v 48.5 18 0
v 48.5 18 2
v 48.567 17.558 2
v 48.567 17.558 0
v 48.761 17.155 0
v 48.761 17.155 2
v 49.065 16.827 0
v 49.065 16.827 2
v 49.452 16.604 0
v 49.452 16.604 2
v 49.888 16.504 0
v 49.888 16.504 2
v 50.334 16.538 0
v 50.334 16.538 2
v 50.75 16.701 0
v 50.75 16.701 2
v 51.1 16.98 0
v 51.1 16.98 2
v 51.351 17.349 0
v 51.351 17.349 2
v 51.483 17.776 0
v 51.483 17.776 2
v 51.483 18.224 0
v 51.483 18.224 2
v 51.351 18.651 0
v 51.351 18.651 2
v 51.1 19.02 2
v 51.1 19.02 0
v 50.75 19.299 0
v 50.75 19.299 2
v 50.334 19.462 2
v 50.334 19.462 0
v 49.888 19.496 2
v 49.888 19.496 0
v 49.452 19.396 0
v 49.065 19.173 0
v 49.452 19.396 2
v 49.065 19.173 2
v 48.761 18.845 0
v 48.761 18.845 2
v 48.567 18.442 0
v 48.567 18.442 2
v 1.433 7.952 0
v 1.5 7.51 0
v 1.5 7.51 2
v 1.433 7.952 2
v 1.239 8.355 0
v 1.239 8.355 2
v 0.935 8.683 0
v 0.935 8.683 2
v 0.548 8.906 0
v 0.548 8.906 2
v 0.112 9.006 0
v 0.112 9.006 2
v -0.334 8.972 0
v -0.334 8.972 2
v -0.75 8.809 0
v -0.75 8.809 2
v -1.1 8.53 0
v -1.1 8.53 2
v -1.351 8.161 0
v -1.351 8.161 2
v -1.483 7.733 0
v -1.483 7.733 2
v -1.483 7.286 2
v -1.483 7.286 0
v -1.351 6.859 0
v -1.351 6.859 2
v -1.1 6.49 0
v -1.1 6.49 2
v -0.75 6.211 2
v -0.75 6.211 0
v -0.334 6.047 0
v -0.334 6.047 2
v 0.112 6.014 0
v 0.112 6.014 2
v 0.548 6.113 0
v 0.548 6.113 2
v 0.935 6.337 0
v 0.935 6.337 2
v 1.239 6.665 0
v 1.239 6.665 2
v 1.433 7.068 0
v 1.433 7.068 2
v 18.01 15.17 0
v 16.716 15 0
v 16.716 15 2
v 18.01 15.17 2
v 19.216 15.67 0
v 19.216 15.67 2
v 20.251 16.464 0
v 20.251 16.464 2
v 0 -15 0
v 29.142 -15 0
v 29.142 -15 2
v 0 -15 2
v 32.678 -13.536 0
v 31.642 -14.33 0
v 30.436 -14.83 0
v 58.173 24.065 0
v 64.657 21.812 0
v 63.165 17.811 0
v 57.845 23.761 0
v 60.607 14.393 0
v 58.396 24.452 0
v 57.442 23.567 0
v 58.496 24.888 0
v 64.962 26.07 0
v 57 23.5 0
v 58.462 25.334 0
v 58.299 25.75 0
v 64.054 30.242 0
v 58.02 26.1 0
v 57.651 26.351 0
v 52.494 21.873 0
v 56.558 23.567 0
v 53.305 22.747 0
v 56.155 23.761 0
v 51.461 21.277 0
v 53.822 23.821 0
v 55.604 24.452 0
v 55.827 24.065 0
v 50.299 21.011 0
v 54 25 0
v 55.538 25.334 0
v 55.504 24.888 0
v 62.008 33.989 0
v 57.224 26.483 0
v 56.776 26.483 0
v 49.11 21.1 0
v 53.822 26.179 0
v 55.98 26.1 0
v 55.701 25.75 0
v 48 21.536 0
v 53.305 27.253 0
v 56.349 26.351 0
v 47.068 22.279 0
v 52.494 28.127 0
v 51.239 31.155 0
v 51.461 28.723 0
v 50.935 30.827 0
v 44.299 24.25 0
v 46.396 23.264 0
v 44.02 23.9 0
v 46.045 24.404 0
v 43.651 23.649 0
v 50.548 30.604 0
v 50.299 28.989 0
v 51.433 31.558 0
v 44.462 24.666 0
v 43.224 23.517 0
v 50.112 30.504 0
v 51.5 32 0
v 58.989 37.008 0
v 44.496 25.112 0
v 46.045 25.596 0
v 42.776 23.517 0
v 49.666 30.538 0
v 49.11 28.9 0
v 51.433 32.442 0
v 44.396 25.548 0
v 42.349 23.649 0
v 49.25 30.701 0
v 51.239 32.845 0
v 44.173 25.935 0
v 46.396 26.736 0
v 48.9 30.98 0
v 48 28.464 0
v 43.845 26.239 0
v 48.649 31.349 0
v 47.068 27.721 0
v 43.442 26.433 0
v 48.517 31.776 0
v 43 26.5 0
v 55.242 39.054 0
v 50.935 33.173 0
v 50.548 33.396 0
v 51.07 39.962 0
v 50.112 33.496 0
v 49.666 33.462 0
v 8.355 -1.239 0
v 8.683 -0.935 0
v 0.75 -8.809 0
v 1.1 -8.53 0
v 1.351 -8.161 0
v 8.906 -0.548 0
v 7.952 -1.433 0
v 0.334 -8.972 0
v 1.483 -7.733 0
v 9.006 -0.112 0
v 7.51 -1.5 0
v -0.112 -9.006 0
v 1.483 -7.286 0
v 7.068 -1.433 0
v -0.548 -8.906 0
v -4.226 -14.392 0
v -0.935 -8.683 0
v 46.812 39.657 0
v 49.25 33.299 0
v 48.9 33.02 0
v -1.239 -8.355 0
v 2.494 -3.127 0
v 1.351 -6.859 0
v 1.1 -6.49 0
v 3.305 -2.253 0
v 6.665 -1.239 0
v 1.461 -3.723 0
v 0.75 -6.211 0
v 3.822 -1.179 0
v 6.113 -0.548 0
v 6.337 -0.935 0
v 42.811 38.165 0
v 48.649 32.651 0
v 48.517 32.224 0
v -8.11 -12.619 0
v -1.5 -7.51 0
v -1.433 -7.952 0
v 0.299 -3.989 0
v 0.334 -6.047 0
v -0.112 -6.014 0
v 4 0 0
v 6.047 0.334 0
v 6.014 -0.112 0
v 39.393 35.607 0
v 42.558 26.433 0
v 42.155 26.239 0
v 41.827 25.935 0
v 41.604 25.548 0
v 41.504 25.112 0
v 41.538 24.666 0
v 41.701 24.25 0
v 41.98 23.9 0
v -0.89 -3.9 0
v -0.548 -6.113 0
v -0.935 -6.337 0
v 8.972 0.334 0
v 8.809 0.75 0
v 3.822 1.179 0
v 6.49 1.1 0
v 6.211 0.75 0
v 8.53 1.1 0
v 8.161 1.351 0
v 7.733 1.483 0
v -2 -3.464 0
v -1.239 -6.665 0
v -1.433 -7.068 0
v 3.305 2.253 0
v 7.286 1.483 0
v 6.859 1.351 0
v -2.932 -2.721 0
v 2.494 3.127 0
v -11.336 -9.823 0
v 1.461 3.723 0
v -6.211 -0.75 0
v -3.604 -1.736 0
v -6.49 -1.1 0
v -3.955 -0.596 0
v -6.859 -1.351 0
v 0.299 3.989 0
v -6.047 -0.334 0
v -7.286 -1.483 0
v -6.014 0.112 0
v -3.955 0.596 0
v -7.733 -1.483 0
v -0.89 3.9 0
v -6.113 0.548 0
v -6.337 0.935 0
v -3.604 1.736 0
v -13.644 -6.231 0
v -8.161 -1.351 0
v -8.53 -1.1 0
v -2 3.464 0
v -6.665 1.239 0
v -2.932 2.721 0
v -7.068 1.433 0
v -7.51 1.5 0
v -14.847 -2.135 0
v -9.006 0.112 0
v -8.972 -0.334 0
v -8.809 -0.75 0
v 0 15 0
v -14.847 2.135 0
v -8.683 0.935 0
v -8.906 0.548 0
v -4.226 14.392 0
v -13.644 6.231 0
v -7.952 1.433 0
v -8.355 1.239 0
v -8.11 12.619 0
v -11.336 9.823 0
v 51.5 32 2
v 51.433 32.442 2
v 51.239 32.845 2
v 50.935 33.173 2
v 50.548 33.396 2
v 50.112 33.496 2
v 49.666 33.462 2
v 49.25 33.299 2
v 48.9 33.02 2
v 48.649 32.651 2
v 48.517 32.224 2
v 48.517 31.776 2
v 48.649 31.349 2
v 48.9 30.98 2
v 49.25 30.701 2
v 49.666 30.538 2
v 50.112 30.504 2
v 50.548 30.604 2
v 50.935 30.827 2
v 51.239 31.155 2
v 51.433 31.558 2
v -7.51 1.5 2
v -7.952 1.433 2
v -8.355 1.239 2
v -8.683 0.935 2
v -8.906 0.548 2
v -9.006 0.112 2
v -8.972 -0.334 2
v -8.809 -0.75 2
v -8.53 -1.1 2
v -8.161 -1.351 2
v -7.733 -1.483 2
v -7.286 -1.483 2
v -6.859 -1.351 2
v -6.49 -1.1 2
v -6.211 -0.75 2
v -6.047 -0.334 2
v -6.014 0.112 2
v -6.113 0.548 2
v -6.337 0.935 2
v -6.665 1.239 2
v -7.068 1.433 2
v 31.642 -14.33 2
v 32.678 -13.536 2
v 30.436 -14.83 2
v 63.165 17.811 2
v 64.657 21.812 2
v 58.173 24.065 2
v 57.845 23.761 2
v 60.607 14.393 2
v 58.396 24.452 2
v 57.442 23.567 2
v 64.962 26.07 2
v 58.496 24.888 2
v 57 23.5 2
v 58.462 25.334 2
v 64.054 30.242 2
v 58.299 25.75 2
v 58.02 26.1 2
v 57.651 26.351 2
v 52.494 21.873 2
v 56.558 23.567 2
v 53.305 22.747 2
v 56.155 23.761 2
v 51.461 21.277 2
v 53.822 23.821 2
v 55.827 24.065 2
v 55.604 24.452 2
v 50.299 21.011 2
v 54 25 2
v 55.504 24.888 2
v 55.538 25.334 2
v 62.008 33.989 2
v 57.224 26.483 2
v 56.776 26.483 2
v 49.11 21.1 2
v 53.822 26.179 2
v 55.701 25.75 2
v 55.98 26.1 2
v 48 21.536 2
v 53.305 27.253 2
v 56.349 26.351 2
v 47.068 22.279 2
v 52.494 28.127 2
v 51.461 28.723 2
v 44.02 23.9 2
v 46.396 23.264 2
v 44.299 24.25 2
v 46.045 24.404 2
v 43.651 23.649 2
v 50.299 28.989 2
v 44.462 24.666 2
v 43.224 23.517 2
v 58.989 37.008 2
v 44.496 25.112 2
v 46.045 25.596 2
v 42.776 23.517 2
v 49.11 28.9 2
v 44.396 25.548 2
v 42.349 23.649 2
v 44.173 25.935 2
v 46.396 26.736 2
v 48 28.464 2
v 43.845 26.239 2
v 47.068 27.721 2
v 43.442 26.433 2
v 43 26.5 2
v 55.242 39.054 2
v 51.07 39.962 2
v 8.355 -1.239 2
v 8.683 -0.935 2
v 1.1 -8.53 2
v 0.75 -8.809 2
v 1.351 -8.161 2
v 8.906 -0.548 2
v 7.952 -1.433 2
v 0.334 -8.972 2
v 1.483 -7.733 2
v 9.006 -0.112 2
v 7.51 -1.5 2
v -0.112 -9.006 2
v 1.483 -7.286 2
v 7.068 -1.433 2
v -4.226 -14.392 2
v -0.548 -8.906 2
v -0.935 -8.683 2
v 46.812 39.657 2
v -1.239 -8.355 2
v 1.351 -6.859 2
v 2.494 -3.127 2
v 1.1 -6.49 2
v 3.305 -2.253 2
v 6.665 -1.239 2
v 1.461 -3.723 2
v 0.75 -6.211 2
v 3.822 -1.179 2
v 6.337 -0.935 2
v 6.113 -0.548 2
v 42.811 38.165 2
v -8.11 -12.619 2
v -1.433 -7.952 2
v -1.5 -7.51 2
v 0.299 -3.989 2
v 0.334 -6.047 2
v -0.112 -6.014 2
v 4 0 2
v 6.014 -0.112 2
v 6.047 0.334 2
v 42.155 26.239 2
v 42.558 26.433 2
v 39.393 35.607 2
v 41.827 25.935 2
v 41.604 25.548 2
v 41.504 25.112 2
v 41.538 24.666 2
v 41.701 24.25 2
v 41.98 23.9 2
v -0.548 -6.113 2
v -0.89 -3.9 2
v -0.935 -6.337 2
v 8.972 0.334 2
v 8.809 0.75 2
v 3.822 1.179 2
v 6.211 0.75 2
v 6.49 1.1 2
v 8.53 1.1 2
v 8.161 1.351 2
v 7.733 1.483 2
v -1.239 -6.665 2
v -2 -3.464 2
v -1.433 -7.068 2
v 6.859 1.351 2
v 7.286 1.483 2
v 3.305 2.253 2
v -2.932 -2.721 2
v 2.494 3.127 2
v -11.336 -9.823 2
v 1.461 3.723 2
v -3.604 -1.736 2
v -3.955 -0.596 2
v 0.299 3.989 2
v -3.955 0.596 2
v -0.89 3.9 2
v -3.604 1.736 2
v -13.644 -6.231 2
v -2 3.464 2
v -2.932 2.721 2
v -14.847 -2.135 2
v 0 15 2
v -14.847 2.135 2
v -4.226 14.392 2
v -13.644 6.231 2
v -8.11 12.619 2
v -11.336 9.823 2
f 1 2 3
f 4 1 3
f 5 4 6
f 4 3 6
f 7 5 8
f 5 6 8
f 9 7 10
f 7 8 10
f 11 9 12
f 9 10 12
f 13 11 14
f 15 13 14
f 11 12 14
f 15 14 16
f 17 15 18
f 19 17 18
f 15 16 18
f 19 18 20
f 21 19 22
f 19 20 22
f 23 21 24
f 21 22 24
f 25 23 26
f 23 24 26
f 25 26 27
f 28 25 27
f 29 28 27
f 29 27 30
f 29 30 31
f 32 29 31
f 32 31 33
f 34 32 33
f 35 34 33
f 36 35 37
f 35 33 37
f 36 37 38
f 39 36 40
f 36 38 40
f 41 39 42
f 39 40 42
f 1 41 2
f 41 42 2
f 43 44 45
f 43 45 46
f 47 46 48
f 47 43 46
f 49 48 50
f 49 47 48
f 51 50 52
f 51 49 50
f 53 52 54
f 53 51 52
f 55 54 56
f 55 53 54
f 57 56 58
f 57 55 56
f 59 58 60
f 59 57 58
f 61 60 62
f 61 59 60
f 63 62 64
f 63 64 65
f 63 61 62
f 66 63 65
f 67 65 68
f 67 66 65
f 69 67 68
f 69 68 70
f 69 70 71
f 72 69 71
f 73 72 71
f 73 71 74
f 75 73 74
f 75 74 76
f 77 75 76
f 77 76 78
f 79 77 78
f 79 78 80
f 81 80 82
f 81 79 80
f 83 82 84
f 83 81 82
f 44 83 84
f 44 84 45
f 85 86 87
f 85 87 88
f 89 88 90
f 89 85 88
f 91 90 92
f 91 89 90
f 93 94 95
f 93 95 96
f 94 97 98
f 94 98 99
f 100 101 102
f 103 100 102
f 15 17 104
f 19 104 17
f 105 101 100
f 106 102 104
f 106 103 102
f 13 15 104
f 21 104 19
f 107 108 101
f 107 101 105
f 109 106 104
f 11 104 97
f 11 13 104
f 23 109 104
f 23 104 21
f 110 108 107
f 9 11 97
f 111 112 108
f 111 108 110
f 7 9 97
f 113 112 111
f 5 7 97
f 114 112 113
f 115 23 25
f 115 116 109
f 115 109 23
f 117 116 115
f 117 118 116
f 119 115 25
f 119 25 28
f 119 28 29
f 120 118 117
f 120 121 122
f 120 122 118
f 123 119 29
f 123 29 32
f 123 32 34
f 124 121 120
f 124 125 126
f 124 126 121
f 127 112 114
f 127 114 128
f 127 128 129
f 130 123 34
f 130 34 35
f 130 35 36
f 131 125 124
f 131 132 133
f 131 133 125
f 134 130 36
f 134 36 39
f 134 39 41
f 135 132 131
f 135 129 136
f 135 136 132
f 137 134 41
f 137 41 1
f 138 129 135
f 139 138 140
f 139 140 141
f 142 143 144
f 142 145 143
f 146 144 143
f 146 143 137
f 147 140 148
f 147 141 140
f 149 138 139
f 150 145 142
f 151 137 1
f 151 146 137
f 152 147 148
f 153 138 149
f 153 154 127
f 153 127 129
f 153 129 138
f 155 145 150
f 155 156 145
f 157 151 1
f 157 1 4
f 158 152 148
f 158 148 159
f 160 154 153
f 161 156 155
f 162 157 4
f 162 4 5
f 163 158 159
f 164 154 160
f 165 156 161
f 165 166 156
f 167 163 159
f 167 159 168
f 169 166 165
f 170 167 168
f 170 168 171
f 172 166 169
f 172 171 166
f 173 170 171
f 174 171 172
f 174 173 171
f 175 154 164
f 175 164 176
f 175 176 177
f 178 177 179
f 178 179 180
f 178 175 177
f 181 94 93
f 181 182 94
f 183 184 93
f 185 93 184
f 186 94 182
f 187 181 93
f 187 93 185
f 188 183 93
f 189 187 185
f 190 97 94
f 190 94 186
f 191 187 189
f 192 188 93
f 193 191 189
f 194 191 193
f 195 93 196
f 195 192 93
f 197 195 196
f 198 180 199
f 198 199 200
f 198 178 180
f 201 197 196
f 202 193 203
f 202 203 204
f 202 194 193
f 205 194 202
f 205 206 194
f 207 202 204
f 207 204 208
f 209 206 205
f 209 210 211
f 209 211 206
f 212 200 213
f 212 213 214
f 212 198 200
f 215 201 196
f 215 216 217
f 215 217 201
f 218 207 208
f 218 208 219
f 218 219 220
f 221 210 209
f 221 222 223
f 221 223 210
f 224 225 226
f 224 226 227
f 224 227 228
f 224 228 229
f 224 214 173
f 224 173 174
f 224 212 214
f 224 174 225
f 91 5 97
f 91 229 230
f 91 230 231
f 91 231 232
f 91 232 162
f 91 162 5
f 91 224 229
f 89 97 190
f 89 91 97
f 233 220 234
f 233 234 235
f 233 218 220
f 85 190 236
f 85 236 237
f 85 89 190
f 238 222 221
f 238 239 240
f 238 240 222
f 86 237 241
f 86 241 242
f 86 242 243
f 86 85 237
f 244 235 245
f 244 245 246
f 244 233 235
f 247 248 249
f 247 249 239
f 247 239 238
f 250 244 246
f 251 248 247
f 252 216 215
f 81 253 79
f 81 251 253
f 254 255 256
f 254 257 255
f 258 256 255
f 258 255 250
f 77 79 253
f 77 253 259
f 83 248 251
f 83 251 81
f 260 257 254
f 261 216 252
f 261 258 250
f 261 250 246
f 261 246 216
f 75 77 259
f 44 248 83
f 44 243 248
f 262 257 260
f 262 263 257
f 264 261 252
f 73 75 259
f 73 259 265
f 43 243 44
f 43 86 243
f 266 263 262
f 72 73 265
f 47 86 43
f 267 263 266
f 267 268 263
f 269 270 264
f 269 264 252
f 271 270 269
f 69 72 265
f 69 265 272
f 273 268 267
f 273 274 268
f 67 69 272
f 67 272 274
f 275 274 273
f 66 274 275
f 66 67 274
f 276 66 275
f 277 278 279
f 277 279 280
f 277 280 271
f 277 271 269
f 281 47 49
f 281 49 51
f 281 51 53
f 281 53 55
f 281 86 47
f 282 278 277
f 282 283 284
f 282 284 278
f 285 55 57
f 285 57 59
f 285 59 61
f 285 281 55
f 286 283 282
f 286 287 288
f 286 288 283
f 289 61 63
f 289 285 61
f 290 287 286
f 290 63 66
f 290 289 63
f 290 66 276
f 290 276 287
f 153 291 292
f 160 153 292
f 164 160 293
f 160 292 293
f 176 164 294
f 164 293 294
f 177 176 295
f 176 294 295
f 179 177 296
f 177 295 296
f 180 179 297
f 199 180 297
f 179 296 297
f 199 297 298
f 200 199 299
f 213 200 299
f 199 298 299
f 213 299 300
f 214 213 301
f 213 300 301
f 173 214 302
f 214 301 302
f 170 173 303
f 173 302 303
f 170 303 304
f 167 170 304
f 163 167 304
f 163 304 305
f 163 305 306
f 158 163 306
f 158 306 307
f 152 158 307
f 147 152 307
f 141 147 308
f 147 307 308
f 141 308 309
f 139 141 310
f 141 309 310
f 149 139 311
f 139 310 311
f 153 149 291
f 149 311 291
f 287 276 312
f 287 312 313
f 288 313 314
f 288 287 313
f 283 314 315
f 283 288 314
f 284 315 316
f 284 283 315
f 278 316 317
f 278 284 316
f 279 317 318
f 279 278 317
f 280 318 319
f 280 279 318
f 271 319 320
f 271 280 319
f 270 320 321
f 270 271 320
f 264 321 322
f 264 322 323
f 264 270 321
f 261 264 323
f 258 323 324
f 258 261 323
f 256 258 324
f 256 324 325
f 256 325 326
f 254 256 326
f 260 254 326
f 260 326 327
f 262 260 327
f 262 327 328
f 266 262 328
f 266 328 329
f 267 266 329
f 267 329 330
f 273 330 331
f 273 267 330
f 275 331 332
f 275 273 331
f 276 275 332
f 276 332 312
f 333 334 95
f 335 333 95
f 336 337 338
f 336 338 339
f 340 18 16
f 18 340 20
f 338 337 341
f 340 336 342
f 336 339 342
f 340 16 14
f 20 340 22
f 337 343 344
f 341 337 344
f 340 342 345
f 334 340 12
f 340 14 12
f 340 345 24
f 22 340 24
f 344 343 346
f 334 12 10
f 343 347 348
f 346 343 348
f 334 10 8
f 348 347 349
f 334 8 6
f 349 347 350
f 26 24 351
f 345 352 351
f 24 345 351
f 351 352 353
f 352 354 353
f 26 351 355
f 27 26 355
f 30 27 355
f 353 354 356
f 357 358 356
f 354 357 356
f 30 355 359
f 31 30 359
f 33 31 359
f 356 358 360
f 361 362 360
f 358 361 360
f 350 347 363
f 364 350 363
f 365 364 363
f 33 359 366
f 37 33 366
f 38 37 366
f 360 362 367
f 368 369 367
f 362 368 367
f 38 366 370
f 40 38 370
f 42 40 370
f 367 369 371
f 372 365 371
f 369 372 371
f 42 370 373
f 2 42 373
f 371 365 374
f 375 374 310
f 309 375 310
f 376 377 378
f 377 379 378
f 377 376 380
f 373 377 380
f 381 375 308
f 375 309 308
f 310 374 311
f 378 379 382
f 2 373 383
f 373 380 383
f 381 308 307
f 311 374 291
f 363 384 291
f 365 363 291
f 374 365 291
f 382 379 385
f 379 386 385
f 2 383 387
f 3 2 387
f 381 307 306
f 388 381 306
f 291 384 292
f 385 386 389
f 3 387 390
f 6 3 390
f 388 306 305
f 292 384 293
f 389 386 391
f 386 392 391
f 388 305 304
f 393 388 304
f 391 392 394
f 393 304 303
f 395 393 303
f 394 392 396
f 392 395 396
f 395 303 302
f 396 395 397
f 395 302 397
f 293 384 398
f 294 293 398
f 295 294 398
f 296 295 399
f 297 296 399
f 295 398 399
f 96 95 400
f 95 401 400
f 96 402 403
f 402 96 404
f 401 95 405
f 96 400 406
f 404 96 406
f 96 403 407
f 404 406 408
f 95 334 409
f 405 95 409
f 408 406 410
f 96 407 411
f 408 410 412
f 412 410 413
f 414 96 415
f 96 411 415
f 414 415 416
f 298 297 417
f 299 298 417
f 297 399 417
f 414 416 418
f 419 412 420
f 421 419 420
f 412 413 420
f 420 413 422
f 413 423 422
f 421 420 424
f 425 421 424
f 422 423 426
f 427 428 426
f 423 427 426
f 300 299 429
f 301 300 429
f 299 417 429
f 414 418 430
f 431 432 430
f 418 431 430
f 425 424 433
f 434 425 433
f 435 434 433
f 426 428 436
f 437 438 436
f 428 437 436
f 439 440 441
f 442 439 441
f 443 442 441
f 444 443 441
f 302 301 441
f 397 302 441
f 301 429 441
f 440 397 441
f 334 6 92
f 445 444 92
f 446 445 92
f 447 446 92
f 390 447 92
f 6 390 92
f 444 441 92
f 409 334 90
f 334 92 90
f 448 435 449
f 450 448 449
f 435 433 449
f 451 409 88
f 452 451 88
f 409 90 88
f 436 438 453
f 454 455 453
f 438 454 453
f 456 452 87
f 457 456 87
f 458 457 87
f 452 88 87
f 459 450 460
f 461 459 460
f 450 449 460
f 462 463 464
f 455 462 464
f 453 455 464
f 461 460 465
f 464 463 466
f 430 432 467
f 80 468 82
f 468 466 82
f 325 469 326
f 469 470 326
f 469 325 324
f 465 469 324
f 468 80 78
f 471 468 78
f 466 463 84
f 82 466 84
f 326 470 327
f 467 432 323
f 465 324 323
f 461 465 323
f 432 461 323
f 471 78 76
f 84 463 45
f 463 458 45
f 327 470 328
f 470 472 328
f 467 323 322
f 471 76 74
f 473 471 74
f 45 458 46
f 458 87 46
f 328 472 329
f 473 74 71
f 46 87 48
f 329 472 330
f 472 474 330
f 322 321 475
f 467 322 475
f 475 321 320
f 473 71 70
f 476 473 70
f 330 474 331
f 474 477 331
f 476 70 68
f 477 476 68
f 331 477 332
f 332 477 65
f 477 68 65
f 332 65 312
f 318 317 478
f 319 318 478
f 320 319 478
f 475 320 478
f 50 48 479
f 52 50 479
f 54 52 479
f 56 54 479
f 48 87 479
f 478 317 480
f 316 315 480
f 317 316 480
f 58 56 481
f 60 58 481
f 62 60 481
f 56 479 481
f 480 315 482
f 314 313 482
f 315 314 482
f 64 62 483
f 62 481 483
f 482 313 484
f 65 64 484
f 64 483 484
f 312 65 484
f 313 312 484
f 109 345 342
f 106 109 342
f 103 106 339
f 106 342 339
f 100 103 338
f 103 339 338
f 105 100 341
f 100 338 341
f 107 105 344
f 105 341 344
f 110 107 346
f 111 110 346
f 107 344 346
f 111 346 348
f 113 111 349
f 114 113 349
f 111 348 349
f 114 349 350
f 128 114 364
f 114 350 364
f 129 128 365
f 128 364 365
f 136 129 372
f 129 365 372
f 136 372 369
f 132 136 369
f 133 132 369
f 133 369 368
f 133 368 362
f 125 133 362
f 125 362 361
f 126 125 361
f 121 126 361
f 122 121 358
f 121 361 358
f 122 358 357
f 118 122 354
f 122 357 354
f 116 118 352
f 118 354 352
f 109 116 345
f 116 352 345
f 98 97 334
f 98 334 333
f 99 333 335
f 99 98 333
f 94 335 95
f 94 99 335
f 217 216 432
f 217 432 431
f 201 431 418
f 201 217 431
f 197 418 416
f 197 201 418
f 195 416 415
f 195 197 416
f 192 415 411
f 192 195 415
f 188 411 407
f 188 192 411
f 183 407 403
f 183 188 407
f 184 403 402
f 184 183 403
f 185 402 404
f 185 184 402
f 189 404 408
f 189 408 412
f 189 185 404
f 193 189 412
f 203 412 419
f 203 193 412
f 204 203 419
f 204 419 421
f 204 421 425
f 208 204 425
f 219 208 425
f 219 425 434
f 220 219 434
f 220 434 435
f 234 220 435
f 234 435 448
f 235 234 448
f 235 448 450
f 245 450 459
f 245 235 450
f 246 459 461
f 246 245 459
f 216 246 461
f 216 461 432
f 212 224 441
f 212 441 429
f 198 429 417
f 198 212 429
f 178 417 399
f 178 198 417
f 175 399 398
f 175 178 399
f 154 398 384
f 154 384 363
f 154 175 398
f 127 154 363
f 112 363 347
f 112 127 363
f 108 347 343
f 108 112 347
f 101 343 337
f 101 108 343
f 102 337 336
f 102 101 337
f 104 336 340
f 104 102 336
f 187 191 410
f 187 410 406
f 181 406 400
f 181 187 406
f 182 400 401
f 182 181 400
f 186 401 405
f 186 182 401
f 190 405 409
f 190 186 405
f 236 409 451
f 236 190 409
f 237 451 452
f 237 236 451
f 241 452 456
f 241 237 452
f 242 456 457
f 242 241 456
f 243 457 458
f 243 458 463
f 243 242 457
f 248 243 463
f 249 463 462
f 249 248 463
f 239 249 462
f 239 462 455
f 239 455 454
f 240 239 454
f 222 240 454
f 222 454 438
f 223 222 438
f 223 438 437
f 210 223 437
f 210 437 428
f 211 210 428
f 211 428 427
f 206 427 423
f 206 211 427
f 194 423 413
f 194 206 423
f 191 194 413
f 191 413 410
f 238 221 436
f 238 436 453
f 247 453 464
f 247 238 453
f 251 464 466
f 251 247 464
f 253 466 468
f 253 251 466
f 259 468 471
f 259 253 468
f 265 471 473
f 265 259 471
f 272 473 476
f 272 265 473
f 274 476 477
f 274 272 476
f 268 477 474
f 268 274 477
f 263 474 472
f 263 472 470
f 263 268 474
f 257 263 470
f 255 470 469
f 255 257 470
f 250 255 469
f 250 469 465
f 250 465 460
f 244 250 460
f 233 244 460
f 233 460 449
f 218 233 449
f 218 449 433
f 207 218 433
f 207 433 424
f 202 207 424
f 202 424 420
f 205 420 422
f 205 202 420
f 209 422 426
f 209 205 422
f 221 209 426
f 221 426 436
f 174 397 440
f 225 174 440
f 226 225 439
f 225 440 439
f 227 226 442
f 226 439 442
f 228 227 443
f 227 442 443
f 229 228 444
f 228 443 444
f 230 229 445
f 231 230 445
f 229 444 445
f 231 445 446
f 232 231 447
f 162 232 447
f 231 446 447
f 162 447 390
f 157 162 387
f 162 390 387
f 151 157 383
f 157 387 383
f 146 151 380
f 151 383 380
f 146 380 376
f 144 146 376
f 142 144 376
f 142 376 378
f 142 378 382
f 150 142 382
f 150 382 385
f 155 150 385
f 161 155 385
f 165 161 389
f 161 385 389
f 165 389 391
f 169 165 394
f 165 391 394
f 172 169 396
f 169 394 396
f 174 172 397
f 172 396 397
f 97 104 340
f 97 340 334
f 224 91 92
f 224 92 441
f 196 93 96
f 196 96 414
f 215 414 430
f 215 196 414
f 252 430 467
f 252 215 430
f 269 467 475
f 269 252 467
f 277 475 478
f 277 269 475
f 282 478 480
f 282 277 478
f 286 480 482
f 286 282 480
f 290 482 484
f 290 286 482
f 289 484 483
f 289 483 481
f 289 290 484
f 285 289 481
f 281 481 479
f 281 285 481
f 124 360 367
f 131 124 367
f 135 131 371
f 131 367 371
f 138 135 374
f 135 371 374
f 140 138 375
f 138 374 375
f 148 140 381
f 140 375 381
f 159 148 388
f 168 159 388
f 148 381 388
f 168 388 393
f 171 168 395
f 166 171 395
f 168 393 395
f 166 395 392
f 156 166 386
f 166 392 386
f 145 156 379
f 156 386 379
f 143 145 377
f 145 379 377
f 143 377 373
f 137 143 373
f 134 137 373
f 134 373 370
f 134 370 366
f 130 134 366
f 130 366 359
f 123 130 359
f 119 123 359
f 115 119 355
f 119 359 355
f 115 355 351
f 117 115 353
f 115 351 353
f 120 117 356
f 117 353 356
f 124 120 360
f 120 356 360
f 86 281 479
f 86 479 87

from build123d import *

# Parameters (mm, degrees)
SALIENTE_EXTRUIR1_DEPTH = 2
CROQUIS1_R              = 4
CORTAR_EXTRUIR1_DEPTH   = 2
CROQUIS2_R              = 1.5
CORTAR_EXTRUIR2_DEPTH   = 2
MATRIZC1_COUNT          = 4
CROQUIS4_R              = 4
CORTAR_EXTRUIR3_DEPTH   = 2
CROQUIS5_R              = 1.5
CORTAR_EXTRUIR4_DEPTH   = 2
MATRIZC2_COUNT          = 4


with BuildPart() as part:
    # Croquis3 → Saliente-Extruir1 (new body)
    with BuildSketch(Plane.XY):
        with BuildLine():
            Line((0, 15), (16.715728753, 15))
            ThreePointArc((16.715728753, 15), (18.629145914, 15.380602337), (20.251262658, 16.464466094))
            Line((20.251262658, 16.464466094), (39.393398282, 35.606601717))
            ThreePointArc((39.393398282, 35.606601717), (60.606601717, 35.606601717), (60.606601717, 14.393398282))
            Line((60.606601717, 14.393398282), (32.67766953, -13.535533906))
            ThreePointArc((32.67766953, -13.535533906), (31.055552786, -14.619397663), (29.142135624, -15))
            Line((29.142135624, -15), (0, -15))
            ThreePointArc((0, -15), (-15, 0), (0, 15))
        make_face()
    extrude(amount=SALIENTE_EXTRUIR1_DEPTH)

    # Croquis1 → Cortar-Extruir1 (cut)
    with BuildSketch(Plane.XY):
        Circle(CROQUIS1_R)
    extrude(amount=CORTAR_EXTRUIR1_DEPTH, mode=Mode.SUBTRACT)

    # Croquis2 → Cortar-Extruir2 (cut)
    with BuildSketch(Plane.XY):
        with Locations((0, 7.509798768)):
            Circle(CROQUIS2_R)
    cortar_extruir2 = extrude(amount=CORTAR_EXTRUIR2_DEPTH, mode=Mode.SUBTRACT)

    # MatrizC1: Cortar-Extruir2 ×4 about axis
    matrizc1_axis = Axis((0, 0, 0), (0, 0, 1))
    for i in range(1, MATRIZC1_COUNT):
        add(cortar_extruir2.rotate(matrizc1_axis, i * 360 / MATRIZC1_COUNT), mode=Mode.SUBTRACT)

    # Croquis4 → Cortar-Extruir3 (cut)
    with BuildSketch(Plane.XY.offset(2)):
        with Locations((50, 25)):
            Circle(CROQUIS4_R)
    extrude(amount=-CORTAR_EXTRUIR3_DEPTH, mode=Mode.SUBTRACT)

    # Croquis5 → Cortar-Extruir4 (cut)
    with BuildSketch(Plane.XY.offset(2)):
        with Locations((50, 32)):
            Circle(CROQUIS5_R)
    cortar_extruir4 = extrude(amount=-CORTAR_EXTRUIR4_DEPTH, mode=Mode.SUBTRACT)

    # MatrizC2: Cortar-Extruir4 ×4 about axis
    matrizc2_axis = Axis((50, 25, 0), (0, 0, 1))
    for i in range(1, MATRIZC2_COUNT):
        add(cortar_extruir4.rotate(matrizc2_axis, i * 360 / MATRIZC2_COUNT), mode=Mode.SUBTRACT)


solid = part.part
